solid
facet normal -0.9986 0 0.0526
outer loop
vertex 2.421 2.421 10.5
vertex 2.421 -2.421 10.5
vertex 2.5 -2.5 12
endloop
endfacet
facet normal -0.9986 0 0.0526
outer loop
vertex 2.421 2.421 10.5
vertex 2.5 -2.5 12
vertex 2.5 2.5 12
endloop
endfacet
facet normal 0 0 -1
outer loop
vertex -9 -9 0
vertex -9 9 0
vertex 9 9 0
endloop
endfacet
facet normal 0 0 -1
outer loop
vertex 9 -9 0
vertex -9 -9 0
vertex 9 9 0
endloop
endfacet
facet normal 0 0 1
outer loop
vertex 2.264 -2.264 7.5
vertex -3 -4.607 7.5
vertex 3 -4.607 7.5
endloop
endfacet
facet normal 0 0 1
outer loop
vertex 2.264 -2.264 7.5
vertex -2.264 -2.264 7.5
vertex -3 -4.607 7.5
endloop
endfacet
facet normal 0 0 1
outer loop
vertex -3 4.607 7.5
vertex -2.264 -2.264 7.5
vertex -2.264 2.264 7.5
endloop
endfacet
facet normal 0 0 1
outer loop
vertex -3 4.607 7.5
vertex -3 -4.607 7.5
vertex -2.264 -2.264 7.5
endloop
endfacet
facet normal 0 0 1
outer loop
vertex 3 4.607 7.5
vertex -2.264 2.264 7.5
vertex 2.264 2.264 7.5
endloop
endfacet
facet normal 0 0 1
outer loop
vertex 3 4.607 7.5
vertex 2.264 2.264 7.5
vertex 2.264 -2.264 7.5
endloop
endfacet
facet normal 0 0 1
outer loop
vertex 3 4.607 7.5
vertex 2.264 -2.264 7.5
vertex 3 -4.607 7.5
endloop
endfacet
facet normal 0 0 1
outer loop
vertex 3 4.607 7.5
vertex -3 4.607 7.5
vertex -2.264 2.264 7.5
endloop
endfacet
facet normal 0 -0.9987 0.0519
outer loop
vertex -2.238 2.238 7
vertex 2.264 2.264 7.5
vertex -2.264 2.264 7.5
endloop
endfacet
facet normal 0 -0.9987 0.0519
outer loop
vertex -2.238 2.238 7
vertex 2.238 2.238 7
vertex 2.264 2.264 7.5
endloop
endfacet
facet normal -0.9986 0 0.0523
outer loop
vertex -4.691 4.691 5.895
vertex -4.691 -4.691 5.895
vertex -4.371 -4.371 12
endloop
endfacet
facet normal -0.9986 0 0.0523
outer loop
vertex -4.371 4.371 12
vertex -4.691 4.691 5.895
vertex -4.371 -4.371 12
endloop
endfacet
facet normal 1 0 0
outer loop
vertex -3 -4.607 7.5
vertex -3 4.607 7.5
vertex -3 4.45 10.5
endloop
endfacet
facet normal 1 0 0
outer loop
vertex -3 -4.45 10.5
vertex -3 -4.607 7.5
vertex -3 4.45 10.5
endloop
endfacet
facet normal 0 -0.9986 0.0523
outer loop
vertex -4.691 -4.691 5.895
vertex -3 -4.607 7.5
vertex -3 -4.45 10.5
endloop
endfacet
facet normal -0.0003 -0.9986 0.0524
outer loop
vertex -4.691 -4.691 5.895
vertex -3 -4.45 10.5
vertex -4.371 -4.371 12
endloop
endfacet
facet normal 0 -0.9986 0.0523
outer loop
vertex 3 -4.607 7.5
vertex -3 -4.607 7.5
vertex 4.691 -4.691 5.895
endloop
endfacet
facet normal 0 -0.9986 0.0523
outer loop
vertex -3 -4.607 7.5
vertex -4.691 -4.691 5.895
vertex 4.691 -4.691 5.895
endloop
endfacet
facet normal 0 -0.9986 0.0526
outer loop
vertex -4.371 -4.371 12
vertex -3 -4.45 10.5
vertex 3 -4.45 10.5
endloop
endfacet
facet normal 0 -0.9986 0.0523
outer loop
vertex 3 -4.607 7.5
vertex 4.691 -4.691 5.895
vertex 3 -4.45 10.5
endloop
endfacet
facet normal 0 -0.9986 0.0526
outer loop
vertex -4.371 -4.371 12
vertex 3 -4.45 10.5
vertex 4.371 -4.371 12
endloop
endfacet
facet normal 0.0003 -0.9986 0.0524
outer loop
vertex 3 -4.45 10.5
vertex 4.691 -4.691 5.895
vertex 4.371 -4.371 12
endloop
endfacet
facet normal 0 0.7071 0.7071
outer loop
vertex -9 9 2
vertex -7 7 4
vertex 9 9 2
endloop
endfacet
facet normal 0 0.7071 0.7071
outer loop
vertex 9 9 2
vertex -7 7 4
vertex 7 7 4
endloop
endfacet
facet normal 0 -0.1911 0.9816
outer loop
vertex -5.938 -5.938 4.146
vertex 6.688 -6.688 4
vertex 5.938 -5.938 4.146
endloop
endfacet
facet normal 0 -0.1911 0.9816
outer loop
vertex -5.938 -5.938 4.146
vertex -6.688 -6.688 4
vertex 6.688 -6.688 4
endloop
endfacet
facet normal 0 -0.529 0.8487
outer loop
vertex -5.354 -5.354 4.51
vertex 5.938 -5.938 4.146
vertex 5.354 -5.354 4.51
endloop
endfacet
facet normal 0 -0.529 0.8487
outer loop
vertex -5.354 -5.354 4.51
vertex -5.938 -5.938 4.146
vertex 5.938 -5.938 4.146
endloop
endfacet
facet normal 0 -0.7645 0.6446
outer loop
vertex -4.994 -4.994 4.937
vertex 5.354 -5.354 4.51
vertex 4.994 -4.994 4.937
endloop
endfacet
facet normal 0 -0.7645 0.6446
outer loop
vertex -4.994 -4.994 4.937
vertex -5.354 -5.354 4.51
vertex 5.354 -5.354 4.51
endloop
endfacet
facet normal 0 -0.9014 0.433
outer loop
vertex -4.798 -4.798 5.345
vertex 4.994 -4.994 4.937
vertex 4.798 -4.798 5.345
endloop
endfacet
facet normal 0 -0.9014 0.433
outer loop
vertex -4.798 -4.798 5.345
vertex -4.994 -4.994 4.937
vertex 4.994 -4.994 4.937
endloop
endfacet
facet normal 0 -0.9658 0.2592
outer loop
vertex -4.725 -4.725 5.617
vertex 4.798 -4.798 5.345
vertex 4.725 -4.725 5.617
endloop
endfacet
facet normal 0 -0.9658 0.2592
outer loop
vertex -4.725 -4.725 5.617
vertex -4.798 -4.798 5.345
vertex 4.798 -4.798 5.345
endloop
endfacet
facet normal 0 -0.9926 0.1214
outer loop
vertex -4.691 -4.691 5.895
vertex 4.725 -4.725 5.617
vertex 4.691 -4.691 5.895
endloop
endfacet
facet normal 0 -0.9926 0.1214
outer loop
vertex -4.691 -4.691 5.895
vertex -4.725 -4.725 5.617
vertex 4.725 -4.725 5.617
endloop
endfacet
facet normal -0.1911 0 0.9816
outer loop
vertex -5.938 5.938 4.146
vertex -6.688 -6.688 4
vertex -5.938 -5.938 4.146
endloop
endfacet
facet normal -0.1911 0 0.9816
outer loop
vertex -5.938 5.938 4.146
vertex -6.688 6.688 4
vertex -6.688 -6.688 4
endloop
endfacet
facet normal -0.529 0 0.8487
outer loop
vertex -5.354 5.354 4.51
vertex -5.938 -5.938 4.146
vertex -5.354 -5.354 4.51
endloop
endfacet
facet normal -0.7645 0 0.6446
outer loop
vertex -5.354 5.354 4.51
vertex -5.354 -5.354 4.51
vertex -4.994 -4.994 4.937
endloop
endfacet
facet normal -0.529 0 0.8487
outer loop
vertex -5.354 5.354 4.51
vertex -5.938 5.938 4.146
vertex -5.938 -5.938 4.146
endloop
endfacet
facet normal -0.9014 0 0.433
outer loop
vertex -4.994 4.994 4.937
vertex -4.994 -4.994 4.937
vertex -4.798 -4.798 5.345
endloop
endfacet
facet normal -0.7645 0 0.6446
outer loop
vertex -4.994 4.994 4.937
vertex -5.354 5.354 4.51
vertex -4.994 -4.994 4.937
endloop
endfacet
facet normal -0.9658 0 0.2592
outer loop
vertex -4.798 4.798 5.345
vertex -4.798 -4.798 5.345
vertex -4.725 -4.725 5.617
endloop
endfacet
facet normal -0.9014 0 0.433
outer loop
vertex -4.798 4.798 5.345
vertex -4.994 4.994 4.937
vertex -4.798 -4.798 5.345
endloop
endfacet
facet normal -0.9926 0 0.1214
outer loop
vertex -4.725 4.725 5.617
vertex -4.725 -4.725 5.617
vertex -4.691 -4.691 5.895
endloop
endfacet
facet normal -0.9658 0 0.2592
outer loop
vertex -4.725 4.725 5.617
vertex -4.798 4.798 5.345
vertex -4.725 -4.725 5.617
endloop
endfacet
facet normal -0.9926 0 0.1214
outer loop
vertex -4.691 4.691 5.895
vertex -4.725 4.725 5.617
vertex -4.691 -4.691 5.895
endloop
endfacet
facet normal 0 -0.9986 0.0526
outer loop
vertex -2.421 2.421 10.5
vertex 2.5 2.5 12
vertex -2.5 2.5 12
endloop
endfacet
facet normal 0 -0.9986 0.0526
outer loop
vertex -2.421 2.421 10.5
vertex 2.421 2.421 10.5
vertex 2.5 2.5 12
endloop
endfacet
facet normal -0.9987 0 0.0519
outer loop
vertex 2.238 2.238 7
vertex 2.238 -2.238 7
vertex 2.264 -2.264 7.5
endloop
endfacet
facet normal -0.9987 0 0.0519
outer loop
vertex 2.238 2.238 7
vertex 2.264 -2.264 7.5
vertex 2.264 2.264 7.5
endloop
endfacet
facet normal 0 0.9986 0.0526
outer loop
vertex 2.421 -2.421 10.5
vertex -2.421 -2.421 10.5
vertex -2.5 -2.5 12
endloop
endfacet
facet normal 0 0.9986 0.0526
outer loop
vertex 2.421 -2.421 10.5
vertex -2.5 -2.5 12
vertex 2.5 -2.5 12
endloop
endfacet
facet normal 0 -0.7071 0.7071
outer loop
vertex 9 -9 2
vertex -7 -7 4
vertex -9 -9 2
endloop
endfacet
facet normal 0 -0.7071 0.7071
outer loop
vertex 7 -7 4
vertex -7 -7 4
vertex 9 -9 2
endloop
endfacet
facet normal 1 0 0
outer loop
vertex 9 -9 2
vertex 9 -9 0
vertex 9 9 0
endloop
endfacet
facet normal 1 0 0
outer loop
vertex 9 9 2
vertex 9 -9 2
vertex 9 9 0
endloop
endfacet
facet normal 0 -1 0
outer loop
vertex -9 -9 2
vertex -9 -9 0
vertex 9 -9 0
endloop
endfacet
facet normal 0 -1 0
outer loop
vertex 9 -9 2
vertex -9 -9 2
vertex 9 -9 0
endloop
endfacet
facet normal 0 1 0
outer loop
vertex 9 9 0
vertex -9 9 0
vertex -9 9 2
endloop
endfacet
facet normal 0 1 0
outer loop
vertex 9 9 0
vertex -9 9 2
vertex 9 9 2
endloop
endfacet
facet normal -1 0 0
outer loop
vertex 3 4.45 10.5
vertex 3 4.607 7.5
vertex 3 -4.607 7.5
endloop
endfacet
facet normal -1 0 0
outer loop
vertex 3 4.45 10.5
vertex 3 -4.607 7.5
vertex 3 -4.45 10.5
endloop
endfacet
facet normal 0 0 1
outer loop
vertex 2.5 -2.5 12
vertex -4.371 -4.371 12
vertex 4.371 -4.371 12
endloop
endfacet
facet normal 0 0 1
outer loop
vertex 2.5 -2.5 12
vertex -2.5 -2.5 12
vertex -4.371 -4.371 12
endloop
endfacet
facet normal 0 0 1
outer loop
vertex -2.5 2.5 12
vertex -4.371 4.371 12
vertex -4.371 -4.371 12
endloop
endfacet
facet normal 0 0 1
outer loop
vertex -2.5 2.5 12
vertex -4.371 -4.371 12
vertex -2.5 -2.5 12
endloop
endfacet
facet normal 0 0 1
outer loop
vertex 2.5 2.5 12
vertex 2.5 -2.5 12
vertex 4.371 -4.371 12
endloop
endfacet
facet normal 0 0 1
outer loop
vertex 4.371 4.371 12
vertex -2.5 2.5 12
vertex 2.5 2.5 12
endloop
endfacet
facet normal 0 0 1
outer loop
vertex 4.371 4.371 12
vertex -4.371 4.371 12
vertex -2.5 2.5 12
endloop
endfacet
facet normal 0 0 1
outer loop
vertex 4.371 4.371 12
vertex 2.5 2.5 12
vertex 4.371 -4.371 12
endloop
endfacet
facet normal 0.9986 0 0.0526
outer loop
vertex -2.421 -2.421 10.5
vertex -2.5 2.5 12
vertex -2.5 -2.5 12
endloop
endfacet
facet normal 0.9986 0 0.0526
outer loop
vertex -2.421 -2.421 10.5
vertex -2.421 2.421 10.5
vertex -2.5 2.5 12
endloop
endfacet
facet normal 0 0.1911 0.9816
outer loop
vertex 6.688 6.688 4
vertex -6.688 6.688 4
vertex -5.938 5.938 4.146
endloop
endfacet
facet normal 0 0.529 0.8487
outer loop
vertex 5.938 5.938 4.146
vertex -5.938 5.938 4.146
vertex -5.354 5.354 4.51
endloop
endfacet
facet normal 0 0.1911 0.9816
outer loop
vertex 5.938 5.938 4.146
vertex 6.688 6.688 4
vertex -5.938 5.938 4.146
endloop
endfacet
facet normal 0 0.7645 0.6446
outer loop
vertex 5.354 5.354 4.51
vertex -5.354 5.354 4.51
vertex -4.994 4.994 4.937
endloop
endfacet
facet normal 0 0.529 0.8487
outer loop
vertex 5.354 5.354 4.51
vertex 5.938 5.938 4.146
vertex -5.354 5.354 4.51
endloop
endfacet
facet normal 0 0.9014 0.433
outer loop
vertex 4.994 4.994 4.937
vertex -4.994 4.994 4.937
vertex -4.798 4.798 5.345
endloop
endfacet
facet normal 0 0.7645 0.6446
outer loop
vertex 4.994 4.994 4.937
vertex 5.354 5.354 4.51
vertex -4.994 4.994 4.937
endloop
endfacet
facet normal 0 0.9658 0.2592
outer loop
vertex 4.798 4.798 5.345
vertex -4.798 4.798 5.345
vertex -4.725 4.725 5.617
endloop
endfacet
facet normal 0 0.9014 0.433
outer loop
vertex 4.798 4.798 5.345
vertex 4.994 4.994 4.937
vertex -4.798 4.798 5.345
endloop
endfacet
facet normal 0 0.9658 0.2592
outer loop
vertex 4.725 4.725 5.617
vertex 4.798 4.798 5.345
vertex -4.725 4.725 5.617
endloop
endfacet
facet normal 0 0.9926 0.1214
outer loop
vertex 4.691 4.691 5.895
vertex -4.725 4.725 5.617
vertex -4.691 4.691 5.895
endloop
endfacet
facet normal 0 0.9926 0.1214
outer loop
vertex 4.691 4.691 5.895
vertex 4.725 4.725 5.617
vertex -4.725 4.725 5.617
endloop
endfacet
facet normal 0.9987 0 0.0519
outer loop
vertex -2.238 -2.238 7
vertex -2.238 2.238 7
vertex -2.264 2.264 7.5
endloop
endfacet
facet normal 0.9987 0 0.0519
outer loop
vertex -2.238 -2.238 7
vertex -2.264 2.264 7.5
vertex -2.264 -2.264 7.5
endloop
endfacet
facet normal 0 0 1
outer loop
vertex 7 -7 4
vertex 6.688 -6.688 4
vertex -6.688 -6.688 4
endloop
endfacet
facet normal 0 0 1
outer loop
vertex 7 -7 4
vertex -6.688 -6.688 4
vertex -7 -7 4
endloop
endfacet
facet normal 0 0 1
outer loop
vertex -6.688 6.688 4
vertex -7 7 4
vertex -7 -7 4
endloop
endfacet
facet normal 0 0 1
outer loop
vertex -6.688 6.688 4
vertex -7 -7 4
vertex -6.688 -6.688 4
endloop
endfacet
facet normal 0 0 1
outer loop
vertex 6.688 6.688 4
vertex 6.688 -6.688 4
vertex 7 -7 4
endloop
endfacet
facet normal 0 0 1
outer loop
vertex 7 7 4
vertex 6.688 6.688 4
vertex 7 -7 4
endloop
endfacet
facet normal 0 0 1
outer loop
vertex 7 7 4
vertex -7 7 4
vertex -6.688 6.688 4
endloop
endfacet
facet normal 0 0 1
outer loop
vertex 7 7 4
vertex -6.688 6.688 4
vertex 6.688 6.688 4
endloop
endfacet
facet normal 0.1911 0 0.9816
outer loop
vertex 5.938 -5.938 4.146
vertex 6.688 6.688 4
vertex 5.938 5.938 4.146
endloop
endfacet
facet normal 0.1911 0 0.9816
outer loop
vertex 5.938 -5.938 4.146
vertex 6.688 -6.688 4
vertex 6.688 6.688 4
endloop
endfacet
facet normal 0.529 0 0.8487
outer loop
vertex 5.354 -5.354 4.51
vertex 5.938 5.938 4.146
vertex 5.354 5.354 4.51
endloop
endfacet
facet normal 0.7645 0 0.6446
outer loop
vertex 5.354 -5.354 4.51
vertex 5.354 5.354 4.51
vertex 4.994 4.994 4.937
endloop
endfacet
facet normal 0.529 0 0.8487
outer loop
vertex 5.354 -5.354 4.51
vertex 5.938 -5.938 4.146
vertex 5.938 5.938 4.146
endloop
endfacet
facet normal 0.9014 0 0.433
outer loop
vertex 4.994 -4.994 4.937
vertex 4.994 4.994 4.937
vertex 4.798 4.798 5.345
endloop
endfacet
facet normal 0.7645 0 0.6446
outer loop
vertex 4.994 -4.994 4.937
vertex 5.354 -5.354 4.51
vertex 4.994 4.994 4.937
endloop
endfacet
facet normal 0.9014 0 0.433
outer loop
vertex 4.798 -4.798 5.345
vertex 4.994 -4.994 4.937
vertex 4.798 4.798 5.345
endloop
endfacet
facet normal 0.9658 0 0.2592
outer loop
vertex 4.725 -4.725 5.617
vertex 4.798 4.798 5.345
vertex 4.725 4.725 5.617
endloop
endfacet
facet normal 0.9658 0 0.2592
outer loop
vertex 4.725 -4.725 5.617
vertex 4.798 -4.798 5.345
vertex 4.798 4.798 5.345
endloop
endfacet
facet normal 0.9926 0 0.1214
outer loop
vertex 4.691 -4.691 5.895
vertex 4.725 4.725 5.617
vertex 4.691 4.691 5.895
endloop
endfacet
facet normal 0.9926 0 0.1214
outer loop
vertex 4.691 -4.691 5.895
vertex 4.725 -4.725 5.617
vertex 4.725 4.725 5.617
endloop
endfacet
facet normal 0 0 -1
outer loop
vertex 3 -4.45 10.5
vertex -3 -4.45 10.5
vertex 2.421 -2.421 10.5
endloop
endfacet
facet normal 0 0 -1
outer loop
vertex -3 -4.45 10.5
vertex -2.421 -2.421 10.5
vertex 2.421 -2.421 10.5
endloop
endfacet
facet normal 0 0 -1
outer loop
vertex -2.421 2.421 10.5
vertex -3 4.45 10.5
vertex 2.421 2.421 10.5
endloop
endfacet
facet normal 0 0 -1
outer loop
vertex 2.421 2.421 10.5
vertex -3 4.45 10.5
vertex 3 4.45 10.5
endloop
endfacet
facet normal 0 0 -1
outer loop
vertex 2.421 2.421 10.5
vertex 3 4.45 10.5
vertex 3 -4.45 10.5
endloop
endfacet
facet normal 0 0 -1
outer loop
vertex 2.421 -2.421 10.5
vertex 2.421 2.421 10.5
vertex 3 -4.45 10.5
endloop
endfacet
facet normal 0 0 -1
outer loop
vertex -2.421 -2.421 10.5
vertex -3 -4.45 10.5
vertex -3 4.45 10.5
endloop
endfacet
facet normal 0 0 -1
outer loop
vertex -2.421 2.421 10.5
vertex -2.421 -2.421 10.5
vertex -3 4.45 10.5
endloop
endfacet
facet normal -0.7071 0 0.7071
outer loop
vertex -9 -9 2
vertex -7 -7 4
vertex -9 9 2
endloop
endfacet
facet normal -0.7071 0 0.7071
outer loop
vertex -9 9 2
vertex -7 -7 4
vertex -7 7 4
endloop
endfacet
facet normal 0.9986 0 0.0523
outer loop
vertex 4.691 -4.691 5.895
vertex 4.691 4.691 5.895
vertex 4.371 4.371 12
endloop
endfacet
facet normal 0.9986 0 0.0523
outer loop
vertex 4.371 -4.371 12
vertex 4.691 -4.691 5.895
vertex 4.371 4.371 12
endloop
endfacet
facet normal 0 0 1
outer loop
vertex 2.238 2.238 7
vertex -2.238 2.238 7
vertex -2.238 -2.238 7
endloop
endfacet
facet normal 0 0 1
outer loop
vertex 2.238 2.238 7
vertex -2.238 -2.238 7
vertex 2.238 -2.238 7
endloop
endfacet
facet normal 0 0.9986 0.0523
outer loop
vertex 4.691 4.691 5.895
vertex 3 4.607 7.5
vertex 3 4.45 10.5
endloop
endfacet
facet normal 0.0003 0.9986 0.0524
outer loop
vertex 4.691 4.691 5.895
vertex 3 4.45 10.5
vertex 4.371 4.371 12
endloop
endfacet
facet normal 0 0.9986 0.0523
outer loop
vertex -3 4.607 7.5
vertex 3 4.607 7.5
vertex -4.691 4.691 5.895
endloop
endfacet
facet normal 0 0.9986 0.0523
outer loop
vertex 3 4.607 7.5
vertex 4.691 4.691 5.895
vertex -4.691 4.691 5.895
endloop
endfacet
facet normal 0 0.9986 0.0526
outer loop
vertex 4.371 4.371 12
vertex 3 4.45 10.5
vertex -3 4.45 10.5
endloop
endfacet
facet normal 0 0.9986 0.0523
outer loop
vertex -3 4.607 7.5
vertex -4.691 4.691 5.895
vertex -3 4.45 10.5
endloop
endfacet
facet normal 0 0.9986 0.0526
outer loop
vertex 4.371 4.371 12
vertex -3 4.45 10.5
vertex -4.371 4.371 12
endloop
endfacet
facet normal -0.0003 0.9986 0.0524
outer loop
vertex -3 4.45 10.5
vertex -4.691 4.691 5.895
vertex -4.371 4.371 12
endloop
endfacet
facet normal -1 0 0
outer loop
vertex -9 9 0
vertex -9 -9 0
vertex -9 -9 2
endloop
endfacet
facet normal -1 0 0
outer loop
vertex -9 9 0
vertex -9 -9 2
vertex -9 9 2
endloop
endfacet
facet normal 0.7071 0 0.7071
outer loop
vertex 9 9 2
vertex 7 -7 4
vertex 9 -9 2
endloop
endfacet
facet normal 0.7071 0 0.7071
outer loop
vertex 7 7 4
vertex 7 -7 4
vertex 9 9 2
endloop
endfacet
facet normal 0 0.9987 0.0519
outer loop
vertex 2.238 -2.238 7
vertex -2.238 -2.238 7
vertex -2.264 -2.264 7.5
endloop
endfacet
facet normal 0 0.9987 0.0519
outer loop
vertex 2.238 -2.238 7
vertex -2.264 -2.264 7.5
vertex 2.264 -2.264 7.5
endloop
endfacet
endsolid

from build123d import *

# Parameters (mm, degrees)
F0_W          = 18
F0_H          = 18
F0_W_2        = 10
F0_H_2        = 10
F1_DEPTH      = 4
F2_DEPTH      = 12
F2_TAPER      = 3
F3_SIZE       = 2
F4_R          = 2
F5_W          = 5
F5_H          = 5
F6_DEPTH      = 5
F6_TAPER      = 3
F7_W          = 6
F7_H          = 3
F8_DEPTH      = 25
F8_DEPTH_BACK = 25


with BuildPart() as f1:
    # F0 (on Top) → F1 (new body)
    with BuildSketch(Plane.XY):
        Rectangle(F0_W, F0_H)
        Rectangle(F0_W_2, F0_H_2, mode=Mode.SUBTRACT)
        Rectangle(F0_W_2, F0_H_2)
    extrude(amount=F1_DEPTH)

    # F0 (on Top) → F2 (join)
    with BuildSketch(Plane.XY):
        Rectangle(F0_W_2, F0_H_2)
    extrude(amount=F2_DEPTH, taper=F2_TAPER)

    # F3
    f3_edges = [f1.edges().sort_by_distance(p)[0] for p in [
        (-9, 0, 4),
        (0, -9, 4),
        (9, 0, 4),
        (0, 9, 4),
    ]]
    chamfer(f3_edges, length=F3_SIZE)

    # F4
    f4_edges = [f1.edges().sort_by_distance(p)[0] for p in [
        (0, -4.790369, 4),
        (-4.790369, 0, 4),
        (4.790369, 0, 4),
        (0, 4.790369, 4),
    ]]
    fillet(f4_edges, radius=F4_R)

    # F5 (on face) → F6 (cut)
    with BuildSketch(Plane.XY.offset(12)):
        Rectangle(F5_W, F5_H)
    extrude(amount=-F6_DEPTH, taper=F6_TAPER, mode=Mode.SUBTRACT)

    # F7 (on Front) → F8 (cut, two sides)
    with BuildSketch(Plane.XZ) as f8_sk:
        with Locations((0, 9)):
            Rectangle(F7_W, F7_H)
    extrude(amount=F8_DEPTH, mode=Mode.SUBTRACT)
    extrude(f8_sk.sketch, amount=-F8_DEPTH_BACK, mode=Mode.SUBTRACT)


solid = f1.part
